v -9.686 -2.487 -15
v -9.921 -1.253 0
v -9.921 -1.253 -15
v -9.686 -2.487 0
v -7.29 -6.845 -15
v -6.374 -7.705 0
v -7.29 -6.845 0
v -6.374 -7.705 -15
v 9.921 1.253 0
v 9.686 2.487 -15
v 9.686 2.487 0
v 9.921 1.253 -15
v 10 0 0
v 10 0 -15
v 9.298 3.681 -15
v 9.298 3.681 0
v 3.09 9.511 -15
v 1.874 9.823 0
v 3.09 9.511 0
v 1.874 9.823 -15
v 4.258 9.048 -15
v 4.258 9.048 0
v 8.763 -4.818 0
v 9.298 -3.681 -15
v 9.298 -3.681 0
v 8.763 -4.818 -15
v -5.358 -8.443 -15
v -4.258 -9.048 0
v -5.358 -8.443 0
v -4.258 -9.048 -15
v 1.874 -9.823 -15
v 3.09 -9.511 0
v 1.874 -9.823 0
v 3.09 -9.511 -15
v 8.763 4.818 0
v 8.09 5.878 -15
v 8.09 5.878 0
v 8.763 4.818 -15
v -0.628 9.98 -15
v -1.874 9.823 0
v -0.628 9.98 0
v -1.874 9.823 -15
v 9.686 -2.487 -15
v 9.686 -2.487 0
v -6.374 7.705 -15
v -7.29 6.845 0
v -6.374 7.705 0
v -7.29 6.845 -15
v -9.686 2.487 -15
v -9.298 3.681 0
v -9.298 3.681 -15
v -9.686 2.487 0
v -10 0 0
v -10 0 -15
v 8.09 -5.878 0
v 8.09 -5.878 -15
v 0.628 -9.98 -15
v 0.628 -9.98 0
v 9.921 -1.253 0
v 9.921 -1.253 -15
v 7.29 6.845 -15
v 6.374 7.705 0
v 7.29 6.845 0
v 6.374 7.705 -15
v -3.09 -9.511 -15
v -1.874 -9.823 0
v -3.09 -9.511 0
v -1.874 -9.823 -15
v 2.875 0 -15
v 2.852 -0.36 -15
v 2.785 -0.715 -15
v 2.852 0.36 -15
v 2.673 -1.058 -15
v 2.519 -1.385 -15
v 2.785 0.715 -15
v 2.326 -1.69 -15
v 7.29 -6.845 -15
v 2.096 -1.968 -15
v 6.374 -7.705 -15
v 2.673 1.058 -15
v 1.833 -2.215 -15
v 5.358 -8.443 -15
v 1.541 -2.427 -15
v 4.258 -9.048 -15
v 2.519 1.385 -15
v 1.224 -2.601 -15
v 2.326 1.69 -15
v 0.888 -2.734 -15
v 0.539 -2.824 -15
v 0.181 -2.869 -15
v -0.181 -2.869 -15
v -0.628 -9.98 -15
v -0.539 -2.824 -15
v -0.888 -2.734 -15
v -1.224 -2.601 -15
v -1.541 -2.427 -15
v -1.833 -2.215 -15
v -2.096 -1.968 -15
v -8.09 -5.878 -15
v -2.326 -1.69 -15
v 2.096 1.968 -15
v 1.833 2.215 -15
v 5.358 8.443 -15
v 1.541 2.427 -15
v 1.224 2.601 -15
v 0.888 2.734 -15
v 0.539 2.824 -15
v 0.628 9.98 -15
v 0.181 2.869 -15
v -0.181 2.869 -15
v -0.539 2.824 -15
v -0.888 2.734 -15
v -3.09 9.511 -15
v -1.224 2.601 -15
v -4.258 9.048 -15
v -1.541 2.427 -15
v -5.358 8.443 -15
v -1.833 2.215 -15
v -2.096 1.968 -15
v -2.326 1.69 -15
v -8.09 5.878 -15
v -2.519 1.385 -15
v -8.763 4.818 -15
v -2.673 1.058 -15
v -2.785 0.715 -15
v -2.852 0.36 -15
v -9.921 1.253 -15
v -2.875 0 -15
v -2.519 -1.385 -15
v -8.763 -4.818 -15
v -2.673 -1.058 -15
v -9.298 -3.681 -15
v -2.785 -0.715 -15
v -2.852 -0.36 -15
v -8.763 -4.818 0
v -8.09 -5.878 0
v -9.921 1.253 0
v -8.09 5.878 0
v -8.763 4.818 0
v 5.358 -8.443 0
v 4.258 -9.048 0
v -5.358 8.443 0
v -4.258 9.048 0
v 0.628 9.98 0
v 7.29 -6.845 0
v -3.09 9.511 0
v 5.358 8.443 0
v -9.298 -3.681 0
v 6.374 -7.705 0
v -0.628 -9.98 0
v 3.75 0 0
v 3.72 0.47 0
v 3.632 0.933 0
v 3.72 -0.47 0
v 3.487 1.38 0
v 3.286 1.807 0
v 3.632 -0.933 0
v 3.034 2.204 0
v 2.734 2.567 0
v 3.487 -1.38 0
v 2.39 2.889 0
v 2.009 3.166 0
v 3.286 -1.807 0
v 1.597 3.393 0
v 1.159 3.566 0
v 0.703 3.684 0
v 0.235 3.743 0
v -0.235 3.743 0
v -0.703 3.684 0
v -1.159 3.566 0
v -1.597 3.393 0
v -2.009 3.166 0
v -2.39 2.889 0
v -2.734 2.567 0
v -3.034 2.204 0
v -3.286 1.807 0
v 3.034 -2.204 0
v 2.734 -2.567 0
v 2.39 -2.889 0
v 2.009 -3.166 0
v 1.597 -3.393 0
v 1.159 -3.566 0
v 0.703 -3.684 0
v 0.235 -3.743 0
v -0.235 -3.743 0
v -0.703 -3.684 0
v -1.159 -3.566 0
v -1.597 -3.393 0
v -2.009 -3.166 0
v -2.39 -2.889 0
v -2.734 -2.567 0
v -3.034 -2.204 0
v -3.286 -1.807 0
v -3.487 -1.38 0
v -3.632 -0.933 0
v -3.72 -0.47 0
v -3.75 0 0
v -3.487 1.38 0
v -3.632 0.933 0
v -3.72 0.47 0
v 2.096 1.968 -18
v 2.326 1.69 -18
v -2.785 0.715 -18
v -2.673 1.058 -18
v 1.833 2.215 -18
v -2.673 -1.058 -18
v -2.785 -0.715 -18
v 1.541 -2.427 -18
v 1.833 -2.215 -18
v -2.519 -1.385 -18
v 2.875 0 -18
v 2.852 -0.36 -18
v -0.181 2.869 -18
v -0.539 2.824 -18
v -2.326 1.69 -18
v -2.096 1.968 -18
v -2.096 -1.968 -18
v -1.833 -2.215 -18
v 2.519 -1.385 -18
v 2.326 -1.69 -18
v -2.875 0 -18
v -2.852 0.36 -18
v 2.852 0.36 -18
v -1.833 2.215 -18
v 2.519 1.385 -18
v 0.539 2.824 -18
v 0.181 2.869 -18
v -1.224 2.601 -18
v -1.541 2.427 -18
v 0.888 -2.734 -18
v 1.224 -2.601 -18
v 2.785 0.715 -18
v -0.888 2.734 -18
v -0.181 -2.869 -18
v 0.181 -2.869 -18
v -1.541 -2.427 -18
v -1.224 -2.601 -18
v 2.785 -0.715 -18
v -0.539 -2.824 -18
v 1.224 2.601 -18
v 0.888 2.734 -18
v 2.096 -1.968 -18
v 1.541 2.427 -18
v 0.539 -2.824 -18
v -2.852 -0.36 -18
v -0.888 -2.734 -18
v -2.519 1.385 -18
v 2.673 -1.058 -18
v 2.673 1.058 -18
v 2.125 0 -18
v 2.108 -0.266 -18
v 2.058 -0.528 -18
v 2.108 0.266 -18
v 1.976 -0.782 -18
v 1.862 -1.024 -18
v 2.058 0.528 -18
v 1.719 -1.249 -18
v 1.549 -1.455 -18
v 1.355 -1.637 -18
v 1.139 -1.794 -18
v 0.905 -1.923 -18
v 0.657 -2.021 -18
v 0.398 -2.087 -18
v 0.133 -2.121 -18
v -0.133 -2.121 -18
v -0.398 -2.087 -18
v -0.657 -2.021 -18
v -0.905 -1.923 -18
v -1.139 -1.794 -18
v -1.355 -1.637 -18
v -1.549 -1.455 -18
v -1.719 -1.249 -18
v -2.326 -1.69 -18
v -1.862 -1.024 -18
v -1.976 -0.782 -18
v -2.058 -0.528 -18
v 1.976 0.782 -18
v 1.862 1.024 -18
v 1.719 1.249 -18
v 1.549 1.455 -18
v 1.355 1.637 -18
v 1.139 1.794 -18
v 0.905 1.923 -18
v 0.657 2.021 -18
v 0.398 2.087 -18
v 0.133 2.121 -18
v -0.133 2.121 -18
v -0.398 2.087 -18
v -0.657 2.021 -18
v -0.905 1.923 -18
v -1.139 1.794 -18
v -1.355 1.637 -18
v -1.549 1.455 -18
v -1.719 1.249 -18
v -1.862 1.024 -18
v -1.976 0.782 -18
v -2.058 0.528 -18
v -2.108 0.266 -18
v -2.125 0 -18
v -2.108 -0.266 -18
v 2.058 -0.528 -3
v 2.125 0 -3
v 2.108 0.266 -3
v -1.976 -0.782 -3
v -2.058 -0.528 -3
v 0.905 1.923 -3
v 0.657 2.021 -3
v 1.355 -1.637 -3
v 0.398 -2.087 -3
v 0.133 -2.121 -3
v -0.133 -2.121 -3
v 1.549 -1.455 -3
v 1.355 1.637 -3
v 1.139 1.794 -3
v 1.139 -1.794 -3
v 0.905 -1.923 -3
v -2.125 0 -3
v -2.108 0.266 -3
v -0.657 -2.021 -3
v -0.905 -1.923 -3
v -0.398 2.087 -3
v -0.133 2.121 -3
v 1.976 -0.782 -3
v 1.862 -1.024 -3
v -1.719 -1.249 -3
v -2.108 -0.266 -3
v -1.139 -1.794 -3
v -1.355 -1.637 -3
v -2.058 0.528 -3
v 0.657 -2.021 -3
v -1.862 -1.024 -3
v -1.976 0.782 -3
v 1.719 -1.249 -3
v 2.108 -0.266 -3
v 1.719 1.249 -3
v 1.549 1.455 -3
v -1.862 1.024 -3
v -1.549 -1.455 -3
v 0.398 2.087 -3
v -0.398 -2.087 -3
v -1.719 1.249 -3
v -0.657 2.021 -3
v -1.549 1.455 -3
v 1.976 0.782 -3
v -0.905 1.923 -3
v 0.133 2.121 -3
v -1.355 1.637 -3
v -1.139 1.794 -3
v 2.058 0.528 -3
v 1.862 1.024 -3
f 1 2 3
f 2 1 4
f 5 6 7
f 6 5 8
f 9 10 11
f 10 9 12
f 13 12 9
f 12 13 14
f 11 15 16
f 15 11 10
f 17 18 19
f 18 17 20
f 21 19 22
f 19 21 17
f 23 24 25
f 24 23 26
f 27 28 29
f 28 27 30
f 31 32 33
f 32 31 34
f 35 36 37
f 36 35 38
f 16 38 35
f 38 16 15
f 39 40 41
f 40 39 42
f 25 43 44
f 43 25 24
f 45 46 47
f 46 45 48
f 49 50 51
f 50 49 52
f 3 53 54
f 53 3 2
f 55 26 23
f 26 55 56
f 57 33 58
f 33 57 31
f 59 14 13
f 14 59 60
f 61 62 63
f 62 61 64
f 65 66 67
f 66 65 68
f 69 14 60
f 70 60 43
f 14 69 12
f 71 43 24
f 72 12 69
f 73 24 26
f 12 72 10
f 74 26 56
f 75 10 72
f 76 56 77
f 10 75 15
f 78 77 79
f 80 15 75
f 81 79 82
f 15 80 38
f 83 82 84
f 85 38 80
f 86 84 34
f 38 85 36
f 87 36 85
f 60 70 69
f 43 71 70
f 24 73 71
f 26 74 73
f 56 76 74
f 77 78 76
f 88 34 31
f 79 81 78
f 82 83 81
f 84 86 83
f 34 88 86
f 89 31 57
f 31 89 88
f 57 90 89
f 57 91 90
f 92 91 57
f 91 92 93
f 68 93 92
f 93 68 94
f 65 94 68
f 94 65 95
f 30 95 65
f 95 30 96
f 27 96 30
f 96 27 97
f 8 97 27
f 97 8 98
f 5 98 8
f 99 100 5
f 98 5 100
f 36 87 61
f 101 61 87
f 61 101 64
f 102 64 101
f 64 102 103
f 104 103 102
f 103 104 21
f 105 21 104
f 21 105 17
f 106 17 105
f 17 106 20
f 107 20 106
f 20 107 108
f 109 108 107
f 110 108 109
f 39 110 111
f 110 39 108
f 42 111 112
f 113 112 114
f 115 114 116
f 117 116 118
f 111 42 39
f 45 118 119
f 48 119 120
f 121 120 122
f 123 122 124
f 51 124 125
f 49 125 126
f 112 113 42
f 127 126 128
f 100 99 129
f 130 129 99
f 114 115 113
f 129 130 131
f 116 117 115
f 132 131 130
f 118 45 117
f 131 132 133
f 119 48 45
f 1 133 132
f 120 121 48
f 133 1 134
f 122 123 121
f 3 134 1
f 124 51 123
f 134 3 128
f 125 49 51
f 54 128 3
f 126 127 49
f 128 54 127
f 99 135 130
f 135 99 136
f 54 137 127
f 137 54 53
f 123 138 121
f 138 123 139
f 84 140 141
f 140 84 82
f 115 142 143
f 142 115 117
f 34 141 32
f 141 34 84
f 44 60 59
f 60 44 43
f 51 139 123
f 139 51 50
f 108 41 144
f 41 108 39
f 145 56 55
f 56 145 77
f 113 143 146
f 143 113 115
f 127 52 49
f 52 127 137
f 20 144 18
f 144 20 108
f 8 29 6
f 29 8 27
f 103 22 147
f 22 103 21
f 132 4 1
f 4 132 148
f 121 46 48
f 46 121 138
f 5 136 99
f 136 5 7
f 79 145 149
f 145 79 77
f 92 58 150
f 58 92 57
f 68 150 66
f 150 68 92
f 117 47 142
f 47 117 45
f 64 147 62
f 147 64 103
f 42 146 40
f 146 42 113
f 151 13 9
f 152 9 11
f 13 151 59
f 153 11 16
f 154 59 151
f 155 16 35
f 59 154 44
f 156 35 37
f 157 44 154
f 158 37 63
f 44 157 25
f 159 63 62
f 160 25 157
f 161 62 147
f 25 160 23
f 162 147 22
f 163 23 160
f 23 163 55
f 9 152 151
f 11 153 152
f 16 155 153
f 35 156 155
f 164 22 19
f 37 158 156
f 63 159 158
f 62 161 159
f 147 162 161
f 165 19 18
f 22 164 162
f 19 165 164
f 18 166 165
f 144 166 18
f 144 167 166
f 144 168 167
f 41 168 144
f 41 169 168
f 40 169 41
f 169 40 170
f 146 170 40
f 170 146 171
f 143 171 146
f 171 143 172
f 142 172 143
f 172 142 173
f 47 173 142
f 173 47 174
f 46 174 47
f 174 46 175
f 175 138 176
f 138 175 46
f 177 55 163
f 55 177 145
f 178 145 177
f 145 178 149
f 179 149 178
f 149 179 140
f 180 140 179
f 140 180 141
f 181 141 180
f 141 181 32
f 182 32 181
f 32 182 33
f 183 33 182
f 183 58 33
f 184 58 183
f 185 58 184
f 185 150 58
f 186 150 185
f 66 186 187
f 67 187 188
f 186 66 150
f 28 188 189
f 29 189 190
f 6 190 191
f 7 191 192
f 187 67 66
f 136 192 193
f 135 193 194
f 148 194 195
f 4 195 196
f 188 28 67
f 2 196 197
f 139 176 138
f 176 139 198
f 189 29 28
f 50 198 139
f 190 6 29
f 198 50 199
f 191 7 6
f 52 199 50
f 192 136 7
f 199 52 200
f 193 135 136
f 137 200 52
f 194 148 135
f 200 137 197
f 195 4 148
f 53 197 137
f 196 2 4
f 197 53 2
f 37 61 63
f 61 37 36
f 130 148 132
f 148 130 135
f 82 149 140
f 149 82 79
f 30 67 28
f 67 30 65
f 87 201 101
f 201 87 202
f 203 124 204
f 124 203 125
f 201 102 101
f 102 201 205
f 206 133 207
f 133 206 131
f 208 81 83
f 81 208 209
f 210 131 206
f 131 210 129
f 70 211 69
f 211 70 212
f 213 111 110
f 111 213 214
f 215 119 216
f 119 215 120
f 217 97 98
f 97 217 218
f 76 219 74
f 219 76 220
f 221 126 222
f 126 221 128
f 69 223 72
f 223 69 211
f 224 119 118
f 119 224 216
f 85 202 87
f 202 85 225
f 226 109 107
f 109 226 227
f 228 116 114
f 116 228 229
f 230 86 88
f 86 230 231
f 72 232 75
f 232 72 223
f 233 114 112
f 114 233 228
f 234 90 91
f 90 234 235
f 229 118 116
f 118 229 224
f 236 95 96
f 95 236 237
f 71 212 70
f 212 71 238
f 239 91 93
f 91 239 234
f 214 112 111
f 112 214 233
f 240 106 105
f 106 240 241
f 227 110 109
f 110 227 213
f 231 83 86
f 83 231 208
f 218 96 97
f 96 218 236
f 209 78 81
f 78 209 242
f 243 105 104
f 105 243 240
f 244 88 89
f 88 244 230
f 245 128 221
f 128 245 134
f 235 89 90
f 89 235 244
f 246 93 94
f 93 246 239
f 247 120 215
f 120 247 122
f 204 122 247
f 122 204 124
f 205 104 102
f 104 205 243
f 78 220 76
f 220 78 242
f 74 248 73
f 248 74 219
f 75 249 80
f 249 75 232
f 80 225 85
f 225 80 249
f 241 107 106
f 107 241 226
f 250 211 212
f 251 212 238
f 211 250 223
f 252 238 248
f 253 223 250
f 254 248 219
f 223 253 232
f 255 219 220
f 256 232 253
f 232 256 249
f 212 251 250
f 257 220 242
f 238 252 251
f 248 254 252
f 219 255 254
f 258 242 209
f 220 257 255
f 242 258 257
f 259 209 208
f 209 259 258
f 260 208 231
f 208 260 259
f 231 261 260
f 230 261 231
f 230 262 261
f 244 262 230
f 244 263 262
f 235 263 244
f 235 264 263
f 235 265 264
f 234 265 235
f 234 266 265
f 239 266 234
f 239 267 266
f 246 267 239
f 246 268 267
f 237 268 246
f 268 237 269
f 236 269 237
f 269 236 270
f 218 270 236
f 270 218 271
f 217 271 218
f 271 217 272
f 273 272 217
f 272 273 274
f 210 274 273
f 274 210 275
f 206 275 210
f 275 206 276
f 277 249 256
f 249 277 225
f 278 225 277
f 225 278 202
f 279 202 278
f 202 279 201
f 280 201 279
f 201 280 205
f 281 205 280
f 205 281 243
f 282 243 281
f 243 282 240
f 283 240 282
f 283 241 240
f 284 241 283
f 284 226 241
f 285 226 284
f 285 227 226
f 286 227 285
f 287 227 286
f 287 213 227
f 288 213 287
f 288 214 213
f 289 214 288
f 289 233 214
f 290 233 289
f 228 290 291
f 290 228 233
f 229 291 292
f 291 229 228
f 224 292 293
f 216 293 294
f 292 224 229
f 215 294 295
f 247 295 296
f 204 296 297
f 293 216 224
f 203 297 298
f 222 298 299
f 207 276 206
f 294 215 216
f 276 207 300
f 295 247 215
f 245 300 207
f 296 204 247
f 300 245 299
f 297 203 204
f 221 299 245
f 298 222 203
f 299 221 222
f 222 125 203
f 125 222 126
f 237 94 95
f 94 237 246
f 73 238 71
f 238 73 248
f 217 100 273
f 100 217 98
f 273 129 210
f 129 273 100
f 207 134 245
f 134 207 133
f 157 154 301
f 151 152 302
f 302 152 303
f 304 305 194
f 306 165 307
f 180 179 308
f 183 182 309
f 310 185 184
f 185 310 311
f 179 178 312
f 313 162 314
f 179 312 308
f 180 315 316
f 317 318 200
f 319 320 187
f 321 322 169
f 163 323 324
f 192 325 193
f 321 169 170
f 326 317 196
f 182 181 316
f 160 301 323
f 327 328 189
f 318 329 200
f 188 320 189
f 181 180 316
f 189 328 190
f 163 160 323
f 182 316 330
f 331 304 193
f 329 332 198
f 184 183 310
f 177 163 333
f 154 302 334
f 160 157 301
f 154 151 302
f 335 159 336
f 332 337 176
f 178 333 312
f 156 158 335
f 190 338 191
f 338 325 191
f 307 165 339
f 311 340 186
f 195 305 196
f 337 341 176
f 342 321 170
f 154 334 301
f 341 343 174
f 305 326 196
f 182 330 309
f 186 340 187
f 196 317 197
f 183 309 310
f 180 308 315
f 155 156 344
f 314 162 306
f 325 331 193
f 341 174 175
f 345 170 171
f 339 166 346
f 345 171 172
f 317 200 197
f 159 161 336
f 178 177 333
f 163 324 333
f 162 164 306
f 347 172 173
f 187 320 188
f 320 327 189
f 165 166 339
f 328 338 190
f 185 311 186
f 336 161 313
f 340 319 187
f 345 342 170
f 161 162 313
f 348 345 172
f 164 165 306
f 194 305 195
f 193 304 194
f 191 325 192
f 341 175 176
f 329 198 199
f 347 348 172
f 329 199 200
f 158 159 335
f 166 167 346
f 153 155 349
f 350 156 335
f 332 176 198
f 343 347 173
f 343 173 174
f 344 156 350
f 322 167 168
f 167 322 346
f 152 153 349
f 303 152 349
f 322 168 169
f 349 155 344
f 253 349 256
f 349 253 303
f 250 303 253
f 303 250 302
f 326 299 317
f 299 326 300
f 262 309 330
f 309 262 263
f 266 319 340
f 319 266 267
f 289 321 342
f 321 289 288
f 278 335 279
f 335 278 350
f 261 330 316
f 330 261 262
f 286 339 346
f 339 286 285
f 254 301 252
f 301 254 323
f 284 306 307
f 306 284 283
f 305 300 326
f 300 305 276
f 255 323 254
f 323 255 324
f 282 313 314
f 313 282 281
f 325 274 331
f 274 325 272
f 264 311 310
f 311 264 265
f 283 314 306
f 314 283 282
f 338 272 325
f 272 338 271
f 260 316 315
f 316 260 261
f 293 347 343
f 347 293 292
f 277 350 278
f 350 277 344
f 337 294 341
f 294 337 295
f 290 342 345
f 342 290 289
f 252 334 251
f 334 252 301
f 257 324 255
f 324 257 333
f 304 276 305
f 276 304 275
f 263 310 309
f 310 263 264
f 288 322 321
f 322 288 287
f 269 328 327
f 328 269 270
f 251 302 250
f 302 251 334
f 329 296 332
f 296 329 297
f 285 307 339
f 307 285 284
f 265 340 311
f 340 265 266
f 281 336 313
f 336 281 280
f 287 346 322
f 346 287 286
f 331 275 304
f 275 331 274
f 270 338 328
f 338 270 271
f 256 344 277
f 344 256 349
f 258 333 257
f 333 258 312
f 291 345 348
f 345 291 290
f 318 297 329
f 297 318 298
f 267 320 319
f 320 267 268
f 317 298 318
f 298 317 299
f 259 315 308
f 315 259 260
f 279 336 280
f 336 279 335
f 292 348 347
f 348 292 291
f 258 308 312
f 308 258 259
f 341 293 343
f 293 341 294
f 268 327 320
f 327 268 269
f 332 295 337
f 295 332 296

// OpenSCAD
$fn = 50;


difference() {
	union() {
		translate(v = [0, 0, -15.0000000000]) {
			cylinder(h = 15, r = 10.0000000000);
		}
		#translate(v = [0, 0, -18.0000000000]) {
			cylinder(h = 18, r = 2.8750000000);
		}
	}
	union() {
		translate(v = [0, 0, 0]) {
			rotate(a = [0, 0, 0]) {
				difference() {
					union() {
						translate(v = [0, 0, -18.0000000000]) {
							cylinder(h = 18, r = 2.0000000000);
						}
						translate(v = [0, 0, -3]) {
							cylinder(h = 3, r1 = 2.1250000000, r2 = 3.7500000000);
						}
						translate(v = [0, 0, -18.0000000000]) {
							cylinder(h = 18, r = 2.1250000000);
						}
						translate(v = [0, 0, -18.0000000000]) {
							cylinder(h = 18, r = 2.0000000000);
						}
					}
					union();
				}
			}
		}
	}
}
